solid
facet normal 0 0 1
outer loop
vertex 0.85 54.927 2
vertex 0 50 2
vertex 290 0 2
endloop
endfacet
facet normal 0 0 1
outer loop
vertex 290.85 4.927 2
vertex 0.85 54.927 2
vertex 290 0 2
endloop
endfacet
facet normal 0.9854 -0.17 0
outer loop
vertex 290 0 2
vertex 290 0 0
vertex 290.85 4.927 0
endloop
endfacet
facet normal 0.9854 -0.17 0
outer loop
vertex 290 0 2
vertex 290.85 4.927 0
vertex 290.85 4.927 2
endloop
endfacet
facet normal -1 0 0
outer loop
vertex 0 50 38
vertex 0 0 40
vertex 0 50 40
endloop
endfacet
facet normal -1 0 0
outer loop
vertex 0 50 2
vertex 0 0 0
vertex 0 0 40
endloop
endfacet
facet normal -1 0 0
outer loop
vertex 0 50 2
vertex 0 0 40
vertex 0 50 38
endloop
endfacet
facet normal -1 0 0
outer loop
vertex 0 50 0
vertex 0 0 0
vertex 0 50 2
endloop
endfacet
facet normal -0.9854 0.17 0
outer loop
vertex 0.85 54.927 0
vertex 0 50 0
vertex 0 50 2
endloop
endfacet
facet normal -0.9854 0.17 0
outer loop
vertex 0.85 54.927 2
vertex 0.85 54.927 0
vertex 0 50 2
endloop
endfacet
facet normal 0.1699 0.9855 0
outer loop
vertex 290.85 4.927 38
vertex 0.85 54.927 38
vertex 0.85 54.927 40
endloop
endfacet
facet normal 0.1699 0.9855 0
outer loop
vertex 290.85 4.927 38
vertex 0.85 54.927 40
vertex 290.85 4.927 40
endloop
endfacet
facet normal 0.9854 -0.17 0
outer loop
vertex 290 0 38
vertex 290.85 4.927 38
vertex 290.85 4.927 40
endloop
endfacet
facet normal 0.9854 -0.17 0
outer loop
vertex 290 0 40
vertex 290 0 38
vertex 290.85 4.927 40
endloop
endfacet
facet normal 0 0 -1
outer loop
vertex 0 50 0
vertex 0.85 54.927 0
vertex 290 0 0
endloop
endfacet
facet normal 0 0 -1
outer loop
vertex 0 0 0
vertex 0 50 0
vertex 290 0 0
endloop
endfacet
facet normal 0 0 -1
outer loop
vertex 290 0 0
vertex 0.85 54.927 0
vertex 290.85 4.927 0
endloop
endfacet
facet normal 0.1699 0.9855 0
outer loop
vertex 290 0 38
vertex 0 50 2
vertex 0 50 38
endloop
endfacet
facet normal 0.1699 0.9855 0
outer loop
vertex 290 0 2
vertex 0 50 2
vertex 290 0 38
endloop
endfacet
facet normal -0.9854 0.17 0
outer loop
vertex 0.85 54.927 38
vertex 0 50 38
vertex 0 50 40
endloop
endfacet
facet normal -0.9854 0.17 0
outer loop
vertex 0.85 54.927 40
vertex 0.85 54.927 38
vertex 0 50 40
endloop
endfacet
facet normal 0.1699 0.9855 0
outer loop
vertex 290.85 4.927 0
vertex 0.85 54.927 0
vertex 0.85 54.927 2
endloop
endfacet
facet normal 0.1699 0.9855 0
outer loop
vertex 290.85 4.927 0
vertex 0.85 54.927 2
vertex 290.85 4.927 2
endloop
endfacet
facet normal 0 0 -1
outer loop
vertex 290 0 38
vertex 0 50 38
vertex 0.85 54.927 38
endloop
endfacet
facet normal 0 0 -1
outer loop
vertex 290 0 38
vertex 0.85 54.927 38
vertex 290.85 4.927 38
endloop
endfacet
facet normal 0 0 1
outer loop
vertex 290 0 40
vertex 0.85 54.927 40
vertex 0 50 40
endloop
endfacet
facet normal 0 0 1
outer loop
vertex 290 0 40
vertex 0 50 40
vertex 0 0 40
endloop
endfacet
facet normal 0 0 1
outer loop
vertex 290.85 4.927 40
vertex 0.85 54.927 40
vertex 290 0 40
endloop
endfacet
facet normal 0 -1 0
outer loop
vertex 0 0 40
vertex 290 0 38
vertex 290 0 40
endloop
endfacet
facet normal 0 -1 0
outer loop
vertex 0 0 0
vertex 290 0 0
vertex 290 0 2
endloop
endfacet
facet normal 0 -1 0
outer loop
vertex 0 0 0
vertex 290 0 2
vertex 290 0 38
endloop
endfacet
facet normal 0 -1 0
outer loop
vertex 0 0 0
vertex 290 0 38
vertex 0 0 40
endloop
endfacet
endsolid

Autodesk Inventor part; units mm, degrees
ref_plane "YZ Plane" through (0, 0, 0) normal (1, 0, 0) x (0, 1, 0)
ref_plane "XZ Plane" through (0, 0, 0) normal (0, 1, 0) x (-1, 0, 0)
ref_plane "XY Plane" through (0, 0, 0) normal (0, 0, 1) x (1, 0, 0)
sketch "Esquisse2" plane through (0, 0, 0) normal (0, 0, 1) x (1, 0, 0)
  line L0 (0, 0) -> (0, 50)
  line L1 (0, 50) -> (290, 0)
  line L2 (290, 0) -> (0, 0)
  dimension "d0" = 290
  dimension "d1" = 50
extrude "Extrusion1" add sketch "Esquisse2" along normal blind 40
sketch "Esquisse3" plane through (0, 50, 40) normal (0.1699069, 0.9854601, 0) x (0.9854601, -0.1699069, 0)
  line L0 (0, 40) -> (0, 0) projected
  line L1 (0, 2) -> (294.2788, 2)
  line L2 (294.2788, 40) -> (294.2788, 0) projected
  line L3 (0, 38) -> (294.2788, 38)
  line L4 (0, 40) -> (294.2788, 40) projected
  line L5 (294.2788, 0) -> (0, 0) projected
  point P0 (8.4953, 40)
  dimension "d5" = 2
  dimension "d6" = 2
extrude "Extrusion2" add sketch "Esquisse3" along normal blind 5 contours L4 L2 L3 L0 | L1 L2 L5 L0
properties part number "rampe-rendmonnaie"
